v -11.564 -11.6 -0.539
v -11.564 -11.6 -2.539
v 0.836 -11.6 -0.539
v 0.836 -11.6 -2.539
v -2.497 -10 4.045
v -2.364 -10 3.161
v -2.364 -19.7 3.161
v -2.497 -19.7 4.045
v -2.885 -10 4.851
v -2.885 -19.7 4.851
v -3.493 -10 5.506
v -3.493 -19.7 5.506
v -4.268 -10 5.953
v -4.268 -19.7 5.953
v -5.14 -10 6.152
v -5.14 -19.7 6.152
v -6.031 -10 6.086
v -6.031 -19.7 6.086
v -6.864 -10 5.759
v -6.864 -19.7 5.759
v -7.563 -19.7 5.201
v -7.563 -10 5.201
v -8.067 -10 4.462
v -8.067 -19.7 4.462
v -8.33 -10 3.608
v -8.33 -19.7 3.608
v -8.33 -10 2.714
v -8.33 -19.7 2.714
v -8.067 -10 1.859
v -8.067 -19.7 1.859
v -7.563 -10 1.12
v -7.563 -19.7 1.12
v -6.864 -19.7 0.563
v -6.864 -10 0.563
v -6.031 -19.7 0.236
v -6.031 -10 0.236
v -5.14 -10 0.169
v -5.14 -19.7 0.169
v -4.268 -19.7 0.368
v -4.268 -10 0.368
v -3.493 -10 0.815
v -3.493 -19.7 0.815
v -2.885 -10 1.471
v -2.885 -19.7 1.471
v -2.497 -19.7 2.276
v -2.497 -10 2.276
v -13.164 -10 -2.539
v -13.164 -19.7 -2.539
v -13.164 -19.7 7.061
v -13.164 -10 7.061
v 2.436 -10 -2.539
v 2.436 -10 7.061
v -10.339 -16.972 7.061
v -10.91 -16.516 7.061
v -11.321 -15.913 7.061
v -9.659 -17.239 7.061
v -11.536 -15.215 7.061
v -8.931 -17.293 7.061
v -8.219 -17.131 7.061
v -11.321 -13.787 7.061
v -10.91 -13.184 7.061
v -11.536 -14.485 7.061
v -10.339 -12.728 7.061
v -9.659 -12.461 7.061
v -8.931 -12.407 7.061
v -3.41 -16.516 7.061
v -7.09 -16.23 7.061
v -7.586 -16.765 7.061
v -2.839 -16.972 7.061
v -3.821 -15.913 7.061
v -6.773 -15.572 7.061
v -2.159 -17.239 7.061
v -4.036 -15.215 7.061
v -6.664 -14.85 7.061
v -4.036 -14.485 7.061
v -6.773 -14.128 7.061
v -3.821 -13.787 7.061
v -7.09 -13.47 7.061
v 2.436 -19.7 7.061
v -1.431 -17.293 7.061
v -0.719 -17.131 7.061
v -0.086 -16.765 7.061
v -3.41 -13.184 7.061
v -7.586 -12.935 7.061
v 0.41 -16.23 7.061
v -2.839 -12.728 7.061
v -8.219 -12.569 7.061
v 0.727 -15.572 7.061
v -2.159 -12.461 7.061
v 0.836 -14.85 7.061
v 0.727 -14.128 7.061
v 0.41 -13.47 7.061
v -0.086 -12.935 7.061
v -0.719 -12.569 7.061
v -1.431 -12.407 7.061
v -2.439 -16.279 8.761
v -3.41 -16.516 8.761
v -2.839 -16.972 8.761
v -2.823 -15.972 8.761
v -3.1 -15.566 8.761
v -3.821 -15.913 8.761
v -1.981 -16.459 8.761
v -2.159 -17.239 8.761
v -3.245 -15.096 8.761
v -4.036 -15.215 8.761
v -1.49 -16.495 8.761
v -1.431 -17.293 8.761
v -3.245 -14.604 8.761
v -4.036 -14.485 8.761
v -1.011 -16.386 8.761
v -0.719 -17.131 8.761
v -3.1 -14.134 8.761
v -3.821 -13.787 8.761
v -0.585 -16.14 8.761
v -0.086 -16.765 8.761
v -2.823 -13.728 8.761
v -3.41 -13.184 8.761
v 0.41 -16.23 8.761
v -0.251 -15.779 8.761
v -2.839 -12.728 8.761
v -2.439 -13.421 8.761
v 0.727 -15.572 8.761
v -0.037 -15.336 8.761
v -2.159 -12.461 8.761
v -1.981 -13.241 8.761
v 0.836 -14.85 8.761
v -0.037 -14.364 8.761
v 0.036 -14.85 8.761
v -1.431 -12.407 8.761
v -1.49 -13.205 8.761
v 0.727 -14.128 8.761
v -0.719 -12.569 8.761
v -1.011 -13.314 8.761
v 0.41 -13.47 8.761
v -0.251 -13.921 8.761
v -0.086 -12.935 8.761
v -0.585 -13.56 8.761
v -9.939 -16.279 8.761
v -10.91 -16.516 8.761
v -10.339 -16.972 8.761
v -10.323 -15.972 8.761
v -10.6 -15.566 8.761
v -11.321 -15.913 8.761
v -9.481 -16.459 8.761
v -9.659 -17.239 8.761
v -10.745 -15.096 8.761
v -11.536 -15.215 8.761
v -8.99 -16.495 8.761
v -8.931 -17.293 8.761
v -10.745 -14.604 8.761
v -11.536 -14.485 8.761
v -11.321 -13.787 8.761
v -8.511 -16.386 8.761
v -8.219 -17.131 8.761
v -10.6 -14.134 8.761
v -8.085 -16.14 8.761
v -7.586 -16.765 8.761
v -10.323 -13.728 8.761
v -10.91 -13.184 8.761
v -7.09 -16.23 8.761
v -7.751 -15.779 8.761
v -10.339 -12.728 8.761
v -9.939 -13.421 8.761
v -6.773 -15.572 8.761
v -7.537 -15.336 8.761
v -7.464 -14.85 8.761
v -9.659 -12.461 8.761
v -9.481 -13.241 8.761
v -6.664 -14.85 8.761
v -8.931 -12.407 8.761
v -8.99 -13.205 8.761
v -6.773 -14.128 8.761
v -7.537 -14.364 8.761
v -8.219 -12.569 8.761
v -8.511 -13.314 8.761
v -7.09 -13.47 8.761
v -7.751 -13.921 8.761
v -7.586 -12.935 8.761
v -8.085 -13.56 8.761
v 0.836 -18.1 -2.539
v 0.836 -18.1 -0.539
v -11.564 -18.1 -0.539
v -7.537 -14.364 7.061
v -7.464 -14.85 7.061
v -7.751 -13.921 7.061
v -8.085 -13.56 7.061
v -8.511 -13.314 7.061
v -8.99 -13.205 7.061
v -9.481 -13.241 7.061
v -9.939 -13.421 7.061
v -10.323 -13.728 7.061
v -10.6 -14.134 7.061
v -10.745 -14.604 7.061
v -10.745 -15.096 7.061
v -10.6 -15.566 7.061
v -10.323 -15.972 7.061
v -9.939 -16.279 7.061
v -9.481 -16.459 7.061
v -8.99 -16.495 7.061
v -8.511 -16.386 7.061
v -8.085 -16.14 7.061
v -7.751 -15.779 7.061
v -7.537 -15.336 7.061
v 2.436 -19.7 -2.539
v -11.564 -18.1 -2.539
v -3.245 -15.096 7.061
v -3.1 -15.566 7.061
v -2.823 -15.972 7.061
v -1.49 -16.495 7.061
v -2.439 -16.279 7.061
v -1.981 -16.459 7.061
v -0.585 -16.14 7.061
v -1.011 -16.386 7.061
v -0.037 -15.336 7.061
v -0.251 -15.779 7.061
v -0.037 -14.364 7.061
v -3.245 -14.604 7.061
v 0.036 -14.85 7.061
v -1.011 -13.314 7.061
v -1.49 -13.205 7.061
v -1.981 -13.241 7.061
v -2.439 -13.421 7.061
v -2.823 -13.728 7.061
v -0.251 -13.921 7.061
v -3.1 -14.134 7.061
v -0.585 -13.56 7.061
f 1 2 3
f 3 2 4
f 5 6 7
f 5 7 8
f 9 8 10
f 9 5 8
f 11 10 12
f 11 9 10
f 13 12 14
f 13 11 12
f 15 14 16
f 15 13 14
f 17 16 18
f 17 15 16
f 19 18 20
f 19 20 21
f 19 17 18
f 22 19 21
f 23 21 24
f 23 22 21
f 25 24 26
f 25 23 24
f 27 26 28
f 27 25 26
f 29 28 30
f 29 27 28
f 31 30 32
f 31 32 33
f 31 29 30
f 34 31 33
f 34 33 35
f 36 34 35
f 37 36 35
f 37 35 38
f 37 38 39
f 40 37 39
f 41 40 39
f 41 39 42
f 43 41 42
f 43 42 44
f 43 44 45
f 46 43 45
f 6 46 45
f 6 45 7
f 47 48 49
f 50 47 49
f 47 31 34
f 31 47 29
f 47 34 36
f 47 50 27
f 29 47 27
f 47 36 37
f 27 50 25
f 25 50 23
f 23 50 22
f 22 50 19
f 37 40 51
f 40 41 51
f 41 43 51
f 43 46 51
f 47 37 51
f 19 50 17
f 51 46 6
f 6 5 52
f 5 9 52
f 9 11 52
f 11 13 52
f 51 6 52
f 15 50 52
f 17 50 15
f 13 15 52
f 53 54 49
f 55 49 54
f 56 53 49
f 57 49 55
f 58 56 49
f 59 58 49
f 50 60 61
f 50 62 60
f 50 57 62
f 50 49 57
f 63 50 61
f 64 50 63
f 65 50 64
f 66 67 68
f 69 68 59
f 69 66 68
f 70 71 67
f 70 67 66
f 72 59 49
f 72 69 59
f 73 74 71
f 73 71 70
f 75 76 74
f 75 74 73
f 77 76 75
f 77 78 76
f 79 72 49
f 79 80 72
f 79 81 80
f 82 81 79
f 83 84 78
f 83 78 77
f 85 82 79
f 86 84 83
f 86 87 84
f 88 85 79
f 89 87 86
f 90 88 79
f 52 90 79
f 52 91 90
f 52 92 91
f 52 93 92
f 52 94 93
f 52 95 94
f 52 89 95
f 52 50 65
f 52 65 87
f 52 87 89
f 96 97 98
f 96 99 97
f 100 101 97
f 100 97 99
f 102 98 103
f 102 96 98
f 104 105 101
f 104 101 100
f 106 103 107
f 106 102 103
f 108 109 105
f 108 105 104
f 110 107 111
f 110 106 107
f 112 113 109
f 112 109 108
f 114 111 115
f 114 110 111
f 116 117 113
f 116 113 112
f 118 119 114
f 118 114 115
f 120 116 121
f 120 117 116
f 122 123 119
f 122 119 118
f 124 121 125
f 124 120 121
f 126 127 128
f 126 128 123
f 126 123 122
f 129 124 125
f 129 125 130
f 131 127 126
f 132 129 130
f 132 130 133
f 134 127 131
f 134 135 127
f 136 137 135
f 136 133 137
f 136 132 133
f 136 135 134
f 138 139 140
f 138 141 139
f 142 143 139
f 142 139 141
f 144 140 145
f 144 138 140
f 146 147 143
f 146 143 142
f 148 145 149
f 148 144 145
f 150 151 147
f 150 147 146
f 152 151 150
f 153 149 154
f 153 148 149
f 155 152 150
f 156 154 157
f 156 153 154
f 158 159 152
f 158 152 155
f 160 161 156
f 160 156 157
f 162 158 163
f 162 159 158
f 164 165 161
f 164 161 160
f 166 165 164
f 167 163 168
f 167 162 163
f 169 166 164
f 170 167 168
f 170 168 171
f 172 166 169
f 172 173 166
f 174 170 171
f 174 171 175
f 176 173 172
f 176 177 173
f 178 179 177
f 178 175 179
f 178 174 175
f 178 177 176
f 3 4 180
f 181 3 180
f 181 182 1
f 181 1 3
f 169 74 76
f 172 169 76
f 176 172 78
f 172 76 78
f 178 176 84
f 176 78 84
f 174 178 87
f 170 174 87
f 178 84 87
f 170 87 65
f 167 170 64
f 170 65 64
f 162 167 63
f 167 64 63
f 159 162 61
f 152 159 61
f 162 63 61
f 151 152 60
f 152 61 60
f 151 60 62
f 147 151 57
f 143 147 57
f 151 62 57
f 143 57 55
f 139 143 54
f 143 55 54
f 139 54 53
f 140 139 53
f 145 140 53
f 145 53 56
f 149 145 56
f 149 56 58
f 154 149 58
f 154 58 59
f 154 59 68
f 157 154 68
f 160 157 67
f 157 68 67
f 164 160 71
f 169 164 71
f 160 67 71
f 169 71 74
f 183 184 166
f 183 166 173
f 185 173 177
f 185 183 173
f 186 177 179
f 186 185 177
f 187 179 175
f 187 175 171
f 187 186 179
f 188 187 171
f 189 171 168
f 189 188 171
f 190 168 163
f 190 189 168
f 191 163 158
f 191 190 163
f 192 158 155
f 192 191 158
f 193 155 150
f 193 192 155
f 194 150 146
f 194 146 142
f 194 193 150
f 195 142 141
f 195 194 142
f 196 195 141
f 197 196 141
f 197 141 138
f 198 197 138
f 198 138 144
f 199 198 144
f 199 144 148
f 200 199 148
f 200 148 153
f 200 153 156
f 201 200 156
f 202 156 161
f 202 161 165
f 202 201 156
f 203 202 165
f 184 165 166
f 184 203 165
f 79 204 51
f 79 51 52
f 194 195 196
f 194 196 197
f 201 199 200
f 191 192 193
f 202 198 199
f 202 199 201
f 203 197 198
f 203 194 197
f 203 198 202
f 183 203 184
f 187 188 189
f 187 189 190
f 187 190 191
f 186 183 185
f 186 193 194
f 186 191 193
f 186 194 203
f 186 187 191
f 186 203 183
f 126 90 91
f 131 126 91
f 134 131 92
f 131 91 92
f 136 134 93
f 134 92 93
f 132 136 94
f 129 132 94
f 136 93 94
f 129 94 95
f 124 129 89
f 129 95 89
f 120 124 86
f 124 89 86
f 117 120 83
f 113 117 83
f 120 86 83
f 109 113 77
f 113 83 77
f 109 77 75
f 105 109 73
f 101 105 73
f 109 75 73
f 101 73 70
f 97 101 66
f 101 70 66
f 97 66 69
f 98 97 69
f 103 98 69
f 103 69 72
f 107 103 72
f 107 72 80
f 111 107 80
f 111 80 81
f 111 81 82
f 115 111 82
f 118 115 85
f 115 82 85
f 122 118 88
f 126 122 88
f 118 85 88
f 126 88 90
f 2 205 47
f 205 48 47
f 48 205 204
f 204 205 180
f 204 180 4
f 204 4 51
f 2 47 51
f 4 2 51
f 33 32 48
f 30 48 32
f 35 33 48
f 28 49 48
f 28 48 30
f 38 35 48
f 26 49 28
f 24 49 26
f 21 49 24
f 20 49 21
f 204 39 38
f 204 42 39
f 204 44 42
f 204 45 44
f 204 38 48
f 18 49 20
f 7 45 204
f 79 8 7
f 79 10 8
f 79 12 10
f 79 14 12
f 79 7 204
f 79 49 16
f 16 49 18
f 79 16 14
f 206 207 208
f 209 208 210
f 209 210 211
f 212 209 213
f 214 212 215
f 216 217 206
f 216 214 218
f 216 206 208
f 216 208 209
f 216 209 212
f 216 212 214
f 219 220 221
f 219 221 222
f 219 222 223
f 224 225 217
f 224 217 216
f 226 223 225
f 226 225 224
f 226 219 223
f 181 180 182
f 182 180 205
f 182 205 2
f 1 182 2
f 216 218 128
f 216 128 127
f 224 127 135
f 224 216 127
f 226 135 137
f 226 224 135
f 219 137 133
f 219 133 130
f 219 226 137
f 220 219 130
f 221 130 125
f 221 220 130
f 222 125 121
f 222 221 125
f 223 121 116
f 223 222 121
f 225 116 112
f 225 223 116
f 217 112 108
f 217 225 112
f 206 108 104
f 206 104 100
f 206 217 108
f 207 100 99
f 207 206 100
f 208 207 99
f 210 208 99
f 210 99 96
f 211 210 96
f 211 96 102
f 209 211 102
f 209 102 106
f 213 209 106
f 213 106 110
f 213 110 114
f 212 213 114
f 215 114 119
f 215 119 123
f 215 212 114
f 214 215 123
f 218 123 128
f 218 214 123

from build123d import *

# Parameters (mm, degrees)
F1_START = 10
F0_W     = 15.6
F0_H     = 9.6
F0_R     = 3
F1_DEPTH = 9.7
F2_R     = 2.45
F2_R_2   = 1.65
F3_DEPTH = 1.7
F5_DEPTH = 2
F0_R_2   = 2.3
F6_DEPTH = 0.8
F7_R     = 3
F7_R_2   = 2.3
F8_DEPTH = 0.8


with BuildPart() as f1:
    # F0 (on Front) → F1 (new body)
    with BuildSketch(Plane.XZ.offset(F1_START)):
        with Locations((-5.3637987003, 2.2607615549)):
            Rectangle(F0_W, F0_H)
        with Locations((-5.3637987003, 3.1607615549)):
            Circle(F0_R, mode=Mode.SUBTRACT)
    extrude(amount=F1_DEPTH)

    # F2 (on face) → F3 (join)
    with BuildSketch(Plane.XY.offset(7.0607615549)):
        with Locations((-1.6137987003, -14.85)):
            Circle(F2_R)
        with Locations((-1.6137987003, -14.85)):
            Circle(F2_R_2, mode=Mode.SUBTRACT)
        with Locations((-9.1137987003, -14.85)):
            Circle(F2_R)
        with Locations((-9.1137987003, -14.85)):
            Circle(F2_R_2, mode=Mode.SUBTRACT)
    extrude(amount=F3_DEPTH)

    # F4 (on face) → F5 (cut)
    with BuildSketch(Plane(origin=(0, 0, -2.5392384451), x_dir=(1, 0, 0), z_dir=(0, 0, -1))):
        Polygon((-11.5637987003, 18.1), (-11.5637987003, 14.85), (-11.5637987003, 11.6), (-5.3637987003, 11.6), (0.8362012997, 11.6), (0.8362012997, 14.85), (0.8362012997, 18.1), (-5.3637987003, 18.1), align=None)
    extrude(amount=-F5_DEPTH, mode=Mode.SUBTRACT)

    # F0 (on Front) → F6 (cut)
    with BuildSketch(Plane.XZ):
        with Locations((-5.3637987003, 3.1607615549)):
            Circle(F0_R)
        with Locations((-5.3637987003, 3.1607615549)):
            Circle(F0_R_2, mode=Mode.SUBTRACT)
    extrude(amount=F6_DEPTH, mode=Mode.SUBTRACT)

    # F7 (on face) → F8 (cut)
    with BuildSketch(Plane.XZ.offset(19.7)):
        with Locations((-5.3637987003, 3.1607615549)):
            Circle(F7_R)
        with Locations((-5.3637987003, 3.1607615549)):
            Circle(F7_R_2, mode=Mode.SUBTRACT)
    extrude(amount=-F8_DEPTH, mode=Mode.SUBTRACT)


solid = f1.part
